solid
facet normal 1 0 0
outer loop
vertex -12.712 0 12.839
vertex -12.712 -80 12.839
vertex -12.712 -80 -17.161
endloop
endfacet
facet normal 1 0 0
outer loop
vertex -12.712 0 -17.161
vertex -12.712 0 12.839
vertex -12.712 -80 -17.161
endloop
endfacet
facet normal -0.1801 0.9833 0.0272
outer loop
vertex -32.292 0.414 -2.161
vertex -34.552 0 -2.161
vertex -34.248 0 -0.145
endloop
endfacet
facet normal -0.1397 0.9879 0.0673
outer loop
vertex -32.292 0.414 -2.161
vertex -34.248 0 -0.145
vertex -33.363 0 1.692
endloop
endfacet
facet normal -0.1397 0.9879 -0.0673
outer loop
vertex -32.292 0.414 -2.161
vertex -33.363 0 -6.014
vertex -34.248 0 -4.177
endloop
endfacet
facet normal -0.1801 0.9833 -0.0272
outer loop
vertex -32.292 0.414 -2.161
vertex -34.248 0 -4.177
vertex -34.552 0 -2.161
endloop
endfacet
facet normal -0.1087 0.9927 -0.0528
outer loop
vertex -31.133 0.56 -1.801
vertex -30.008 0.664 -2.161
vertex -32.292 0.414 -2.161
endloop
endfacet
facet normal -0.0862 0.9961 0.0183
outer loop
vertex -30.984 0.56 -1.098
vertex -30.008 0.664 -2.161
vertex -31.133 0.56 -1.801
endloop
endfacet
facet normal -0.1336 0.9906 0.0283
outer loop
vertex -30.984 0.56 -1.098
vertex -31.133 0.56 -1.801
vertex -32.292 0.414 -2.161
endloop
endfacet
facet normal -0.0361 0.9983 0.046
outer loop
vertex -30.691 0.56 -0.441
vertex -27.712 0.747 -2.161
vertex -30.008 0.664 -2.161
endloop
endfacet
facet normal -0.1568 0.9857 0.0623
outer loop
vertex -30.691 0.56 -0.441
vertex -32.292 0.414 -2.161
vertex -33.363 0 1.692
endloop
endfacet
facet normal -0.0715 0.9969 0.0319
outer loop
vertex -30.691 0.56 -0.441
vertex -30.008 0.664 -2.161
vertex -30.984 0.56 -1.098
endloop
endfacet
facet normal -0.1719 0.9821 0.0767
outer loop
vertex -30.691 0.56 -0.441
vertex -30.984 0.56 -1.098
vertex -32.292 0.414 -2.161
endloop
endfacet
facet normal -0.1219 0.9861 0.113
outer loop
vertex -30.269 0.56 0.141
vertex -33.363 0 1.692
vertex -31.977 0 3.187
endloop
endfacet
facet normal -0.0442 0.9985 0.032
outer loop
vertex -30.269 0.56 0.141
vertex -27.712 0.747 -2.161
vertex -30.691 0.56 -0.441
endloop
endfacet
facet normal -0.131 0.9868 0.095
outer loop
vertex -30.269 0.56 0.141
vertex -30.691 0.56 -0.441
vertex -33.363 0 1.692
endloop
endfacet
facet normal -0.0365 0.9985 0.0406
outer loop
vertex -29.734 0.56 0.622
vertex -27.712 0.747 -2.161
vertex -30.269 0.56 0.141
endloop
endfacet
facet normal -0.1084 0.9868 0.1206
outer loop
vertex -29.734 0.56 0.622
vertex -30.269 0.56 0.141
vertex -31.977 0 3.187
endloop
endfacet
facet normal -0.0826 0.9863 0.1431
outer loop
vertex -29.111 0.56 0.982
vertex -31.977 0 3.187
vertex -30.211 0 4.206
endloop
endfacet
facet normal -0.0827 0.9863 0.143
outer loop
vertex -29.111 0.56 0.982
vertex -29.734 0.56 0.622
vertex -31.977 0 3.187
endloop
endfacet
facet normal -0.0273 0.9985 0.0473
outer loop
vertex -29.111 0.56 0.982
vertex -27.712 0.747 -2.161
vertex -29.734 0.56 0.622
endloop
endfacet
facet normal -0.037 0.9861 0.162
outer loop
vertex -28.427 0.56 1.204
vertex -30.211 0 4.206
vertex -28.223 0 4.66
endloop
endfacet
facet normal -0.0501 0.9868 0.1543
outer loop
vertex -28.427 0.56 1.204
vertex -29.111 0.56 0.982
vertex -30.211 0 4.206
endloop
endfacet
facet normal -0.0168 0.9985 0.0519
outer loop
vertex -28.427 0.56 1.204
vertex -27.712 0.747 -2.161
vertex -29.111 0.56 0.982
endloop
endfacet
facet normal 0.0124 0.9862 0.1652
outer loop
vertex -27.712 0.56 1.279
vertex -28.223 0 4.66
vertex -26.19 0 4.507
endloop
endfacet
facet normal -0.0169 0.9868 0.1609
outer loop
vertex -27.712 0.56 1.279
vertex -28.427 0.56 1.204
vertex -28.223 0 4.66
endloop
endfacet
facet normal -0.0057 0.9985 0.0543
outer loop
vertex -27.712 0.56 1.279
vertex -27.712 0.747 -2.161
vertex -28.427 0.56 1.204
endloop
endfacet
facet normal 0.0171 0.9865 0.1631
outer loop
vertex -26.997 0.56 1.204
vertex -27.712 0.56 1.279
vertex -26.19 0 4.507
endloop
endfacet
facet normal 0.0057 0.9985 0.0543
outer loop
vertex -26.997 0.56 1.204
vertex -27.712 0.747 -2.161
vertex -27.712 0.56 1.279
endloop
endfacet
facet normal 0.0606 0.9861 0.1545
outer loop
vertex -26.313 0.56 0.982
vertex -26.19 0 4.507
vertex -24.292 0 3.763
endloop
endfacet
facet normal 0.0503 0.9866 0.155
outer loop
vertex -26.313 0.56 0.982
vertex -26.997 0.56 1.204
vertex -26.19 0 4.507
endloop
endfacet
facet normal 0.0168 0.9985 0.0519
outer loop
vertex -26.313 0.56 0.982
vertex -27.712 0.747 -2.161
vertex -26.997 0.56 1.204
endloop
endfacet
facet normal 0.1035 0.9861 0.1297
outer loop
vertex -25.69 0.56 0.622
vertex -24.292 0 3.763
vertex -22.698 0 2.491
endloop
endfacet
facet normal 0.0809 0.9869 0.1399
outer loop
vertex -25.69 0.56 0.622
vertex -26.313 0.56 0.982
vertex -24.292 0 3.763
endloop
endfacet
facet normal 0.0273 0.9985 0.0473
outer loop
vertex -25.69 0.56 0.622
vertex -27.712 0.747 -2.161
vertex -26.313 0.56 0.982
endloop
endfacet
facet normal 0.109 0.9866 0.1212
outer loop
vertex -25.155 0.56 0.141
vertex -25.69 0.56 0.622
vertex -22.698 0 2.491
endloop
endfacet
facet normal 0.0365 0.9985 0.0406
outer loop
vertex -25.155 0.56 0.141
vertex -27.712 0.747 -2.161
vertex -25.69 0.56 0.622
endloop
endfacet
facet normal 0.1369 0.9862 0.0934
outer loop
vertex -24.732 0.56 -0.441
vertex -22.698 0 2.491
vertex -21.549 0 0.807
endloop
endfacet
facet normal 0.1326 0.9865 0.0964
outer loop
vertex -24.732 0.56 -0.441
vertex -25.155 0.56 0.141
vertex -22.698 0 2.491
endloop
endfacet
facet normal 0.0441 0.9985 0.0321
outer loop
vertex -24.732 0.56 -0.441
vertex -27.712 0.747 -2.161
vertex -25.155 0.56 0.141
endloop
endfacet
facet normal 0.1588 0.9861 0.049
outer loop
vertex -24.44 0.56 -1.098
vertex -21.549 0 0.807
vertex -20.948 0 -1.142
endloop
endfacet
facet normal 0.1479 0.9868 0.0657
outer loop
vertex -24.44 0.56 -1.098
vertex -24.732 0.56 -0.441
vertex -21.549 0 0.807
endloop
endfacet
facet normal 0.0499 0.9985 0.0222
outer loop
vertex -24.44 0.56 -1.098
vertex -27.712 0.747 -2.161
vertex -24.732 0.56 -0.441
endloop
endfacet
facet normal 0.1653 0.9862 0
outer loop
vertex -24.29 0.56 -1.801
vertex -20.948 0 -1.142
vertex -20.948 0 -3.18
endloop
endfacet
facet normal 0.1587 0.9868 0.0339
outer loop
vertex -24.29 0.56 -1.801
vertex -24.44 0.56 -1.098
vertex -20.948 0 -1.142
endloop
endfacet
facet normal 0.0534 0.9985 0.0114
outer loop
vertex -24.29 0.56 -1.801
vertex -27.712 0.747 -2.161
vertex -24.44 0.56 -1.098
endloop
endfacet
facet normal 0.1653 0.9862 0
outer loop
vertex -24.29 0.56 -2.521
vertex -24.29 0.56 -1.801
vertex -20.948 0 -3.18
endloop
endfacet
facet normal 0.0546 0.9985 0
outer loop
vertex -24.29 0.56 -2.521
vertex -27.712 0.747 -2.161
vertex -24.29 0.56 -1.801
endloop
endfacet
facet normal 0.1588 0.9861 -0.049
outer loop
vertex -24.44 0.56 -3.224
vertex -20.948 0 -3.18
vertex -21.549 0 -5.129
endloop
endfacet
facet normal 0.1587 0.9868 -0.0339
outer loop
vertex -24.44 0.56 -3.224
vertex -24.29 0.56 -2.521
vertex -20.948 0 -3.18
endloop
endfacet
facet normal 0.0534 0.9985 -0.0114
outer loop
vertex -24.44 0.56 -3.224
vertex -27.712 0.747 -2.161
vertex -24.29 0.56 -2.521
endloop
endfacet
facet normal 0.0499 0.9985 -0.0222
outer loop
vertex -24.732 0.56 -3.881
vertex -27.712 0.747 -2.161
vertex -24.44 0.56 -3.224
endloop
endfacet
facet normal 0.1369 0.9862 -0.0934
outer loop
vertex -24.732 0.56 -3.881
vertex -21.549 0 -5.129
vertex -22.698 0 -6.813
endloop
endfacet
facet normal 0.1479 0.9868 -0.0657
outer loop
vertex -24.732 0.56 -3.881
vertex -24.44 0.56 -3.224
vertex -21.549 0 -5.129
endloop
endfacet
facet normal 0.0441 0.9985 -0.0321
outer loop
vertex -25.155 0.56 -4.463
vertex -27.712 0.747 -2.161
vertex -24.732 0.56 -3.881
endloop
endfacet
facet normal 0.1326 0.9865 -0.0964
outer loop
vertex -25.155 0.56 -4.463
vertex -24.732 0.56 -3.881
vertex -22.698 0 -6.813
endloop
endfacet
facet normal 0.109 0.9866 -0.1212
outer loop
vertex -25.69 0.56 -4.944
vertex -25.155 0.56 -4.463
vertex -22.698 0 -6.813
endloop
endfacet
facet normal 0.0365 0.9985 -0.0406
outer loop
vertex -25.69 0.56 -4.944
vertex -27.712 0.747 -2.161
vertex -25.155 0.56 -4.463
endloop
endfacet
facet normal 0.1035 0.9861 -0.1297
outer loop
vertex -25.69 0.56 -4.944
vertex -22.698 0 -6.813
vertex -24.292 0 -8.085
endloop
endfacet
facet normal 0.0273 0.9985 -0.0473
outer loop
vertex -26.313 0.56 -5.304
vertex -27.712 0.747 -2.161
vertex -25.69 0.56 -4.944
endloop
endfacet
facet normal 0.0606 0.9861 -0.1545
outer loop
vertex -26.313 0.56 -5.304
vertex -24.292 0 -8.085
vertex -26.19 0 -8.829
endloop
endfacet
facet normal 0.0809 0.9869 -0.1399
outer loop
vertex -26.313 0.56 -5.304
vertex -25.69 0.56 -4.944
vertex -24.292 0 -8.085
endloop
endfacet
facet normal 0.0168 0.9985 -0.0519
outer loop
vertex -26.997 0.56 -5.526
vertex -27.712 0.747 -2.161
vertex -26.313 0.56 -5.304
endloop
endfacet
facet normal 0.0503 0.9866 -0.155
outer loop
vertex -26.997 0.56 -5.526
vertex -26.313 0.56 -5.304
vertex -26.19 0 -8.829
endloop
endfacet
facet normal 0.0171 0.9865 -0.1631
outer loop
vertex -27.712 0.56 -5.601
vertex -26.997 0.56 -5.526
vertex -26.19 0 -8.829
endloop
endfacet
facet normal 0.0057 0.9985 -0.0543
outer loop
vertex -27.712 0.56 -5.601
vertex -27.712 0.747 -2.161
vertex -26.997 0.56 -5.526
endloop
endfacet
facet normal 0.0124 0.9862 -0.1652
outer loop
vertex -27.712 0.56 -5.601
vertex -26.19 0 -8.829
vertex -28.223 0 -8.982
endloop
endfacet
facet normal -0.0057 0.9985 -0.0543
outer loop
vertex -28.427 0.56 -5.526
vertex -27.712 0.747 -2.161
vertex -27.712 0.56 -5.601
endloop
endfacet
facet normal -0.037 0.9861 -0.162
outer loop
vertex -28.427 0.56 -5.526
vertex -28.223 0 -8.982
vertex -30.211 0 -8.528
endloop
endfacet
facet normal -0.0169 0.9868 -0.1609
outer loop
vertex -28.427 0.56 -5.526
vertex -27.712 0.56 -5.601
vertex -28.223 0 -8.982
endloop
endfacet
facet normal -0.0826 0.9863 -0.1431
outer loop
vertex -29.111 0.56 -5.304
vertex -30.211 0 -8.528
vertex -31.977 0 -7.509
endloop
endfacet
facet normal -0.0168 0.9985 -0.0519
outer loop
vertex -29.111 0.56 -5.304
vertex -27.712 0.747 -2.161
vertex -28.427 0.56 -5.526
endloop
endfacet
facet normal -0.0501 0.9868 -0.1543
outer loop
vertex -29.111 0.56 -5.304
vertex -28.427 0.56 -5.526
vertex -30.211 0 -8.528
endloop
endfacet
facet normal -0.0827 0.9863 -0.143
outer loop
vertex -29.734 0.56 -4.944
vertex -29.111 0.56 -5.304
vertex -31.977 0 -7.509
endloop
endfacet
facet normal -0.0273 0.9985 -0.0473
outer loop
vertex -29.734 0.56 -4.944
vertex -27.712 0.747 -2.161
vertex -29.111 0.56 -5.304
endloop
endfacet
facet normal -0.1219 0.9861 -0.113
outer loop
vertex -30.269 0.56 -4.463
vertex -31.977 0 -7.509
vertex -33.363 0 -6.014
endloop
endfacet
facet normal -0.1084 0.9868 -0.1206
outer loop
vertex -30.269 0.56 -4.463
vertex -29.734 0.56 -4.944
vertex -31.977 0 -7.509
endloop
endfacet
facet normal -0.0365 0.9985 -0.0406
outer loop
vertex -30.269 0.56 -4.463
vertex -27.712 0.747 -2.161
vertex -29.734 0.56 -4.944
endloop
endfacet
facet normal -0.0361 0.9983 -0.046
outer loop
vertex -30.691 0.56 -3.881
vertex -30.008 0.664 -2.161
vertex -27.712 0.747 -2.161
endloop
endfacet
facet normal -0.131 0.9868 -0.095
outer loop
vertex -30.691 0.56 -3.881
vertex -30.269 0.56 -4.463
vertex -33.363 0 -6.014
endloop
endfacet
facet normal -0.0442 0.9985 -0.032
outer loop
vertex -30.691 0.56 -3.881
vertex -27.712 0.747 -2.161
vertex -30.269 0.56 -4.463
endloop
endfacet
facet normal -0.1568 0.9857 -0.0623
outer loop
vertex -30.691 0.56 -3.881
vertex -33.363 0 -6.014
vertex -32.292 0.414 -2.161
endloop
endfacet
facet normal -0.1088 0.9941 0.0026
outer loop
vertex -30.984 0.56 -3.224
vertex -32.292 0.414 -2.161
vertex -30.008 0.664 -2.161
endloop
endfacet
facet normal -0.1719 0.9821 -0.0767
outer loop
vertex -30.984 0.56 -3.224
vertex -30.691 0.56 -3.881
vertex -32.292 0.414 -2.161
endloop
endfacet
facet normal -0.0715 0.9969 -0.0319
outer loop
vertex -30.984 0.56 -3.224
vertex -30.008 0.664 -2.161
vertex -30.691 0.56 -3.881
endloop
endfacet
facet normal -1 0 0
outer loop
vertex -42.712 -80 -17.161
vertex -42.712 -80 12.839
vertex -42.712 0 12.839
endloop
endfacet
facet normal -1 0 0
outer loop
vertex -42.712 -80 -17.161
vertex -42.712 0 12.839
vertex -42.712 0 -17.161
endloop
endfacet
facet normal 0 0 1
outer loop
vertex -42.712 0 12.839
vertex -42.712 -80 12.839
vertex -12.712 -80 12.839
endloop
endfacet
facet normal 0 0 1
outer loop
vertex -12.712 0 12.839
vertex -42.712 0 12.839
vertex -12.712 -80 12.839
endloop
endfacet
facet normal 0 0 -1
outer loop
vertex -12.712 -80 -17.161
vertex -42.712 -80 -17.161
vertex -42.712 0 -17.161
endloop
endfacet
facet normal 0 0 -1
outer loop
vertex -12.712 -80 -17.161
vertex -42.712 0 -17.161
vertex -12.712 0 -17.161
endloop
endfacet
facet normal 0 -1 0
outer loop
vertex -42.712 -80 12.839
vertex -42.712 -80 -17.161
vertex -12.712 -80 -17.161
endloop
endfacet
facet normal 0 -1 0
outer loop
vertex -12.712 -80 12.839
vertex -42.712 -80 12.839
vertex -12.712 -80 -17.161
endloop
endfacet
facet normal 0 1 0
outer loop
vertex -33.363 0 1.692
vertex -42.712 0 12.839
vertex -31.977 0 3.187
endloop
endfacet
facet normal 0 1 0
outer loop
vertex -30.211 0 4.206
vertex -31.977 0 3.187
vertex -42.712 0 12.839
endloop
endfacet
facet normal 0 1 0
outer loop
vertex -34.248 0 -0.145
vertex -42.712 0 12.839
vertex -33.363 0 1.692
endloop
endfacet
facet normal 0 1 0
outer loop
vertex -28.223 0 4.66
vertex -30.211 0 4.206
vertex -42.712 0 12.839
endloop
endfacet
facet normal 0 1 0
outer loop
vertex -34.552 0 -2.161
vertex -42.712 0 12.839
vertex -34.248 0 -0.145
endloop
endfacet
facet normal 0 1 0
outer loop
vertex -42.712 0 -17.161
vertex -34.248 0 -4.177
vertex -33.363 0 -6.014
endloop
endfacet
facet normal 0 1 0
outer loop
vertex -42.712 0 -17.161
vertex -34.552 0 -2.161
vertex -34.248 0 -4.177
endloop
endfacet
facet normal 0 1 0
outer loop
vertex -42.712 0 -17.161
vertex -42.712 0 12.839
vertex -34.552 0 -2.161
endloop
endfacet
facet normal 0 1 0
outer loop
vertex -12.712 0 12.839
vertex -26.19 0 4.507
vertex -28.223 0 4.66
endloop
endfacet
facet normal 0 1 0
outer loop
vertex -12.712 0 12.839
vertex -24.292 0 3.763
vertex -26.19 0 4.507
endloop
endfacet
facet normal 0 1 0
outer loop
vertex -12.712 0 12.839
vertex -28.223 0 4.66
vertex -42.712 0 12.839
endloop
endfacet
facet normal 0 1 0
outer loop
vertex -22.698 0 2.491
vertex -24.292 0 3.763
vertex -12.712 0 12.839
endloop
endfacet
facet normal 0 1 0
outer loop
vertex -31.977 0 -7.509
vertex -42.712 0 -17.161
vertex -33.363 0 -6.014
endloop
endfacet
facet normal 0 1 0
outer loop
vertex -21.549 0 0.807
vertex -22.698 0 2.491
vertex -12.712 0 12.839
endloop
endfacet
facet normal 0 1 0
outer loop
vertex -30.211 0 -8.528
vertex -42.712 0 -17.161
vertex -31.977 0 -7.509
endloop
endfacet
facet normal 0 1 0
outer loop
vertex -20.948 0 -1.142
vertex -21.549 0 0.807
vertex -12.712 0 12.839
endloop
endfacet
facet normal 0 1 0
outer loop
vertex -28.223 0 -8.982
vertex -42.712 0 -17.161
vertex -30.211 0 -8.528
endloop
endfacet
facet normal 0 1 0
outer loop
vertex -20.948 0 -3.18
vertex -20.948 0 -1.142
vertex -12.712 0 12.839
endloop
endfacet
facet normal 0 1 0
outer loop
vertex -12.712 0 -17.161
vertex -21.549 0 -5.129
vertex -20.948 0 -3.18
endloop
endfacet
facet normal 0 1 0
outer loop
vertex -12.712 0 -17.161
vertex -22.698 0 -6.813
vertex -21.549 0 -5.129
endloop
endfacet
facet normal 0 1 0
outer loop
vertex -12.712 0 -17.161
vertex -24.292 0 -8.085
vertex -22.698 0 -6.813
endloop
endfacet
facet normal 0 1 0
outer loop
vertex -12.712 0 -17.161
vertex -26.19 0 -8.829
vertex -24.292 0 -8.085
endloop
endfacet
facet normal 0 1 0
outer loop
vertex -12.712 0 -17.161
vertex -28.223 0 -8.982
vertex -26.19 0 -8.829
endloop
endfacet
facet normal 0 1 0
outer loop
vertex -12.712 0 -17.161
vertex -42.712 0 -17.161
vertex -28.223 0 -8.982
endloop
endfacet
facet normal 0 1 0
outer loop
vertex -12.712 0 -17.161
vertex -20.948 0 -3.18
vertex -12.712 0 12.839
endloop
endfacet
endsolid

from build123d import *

# Parameters (mm, degrees)
SKETCH1_W           = 30
SKETCH1_H           = 30
BOSS_EXTRUDE1_DEPTH = 80


with BuildPart() as part:
    # Sketch1 → Boss-Extrude1 (new body)
    with BuildSketch(Plane(origin=(0, 0, 0), x_dir=(1, 0, 0), z_dir=(0, 1, 0))):
        with Locations((-27.711864407, 2.161016949)):
            Rectangle(SKETCH1_W, SKETCH1_H)
    extrude(amount=-BOSS_EXTRUDE1_DEPTH)

    # Sketch2 → Revolve4 (revolve)
    with BuildSketch(Plane(origin=(0, 0, -2.161016949), x_dir=(-1, 0, 0), z_dir=(0, 0, -1))):
        with BuildLine():
            Line((27.711864407, 0), (34.551820017, 0))
            ThreePointArc((34.551820017, 0), (31.152183546, 0.559787224), (27.711864407, 0.747121391))
            Line((27.711864407, 0.747121391), (27.711864407, 0))
        make_face()
    revolve(axis=Axis((-27.711864407, -84, -2.161016949), (0, 1, 0)))


solid = part.part
